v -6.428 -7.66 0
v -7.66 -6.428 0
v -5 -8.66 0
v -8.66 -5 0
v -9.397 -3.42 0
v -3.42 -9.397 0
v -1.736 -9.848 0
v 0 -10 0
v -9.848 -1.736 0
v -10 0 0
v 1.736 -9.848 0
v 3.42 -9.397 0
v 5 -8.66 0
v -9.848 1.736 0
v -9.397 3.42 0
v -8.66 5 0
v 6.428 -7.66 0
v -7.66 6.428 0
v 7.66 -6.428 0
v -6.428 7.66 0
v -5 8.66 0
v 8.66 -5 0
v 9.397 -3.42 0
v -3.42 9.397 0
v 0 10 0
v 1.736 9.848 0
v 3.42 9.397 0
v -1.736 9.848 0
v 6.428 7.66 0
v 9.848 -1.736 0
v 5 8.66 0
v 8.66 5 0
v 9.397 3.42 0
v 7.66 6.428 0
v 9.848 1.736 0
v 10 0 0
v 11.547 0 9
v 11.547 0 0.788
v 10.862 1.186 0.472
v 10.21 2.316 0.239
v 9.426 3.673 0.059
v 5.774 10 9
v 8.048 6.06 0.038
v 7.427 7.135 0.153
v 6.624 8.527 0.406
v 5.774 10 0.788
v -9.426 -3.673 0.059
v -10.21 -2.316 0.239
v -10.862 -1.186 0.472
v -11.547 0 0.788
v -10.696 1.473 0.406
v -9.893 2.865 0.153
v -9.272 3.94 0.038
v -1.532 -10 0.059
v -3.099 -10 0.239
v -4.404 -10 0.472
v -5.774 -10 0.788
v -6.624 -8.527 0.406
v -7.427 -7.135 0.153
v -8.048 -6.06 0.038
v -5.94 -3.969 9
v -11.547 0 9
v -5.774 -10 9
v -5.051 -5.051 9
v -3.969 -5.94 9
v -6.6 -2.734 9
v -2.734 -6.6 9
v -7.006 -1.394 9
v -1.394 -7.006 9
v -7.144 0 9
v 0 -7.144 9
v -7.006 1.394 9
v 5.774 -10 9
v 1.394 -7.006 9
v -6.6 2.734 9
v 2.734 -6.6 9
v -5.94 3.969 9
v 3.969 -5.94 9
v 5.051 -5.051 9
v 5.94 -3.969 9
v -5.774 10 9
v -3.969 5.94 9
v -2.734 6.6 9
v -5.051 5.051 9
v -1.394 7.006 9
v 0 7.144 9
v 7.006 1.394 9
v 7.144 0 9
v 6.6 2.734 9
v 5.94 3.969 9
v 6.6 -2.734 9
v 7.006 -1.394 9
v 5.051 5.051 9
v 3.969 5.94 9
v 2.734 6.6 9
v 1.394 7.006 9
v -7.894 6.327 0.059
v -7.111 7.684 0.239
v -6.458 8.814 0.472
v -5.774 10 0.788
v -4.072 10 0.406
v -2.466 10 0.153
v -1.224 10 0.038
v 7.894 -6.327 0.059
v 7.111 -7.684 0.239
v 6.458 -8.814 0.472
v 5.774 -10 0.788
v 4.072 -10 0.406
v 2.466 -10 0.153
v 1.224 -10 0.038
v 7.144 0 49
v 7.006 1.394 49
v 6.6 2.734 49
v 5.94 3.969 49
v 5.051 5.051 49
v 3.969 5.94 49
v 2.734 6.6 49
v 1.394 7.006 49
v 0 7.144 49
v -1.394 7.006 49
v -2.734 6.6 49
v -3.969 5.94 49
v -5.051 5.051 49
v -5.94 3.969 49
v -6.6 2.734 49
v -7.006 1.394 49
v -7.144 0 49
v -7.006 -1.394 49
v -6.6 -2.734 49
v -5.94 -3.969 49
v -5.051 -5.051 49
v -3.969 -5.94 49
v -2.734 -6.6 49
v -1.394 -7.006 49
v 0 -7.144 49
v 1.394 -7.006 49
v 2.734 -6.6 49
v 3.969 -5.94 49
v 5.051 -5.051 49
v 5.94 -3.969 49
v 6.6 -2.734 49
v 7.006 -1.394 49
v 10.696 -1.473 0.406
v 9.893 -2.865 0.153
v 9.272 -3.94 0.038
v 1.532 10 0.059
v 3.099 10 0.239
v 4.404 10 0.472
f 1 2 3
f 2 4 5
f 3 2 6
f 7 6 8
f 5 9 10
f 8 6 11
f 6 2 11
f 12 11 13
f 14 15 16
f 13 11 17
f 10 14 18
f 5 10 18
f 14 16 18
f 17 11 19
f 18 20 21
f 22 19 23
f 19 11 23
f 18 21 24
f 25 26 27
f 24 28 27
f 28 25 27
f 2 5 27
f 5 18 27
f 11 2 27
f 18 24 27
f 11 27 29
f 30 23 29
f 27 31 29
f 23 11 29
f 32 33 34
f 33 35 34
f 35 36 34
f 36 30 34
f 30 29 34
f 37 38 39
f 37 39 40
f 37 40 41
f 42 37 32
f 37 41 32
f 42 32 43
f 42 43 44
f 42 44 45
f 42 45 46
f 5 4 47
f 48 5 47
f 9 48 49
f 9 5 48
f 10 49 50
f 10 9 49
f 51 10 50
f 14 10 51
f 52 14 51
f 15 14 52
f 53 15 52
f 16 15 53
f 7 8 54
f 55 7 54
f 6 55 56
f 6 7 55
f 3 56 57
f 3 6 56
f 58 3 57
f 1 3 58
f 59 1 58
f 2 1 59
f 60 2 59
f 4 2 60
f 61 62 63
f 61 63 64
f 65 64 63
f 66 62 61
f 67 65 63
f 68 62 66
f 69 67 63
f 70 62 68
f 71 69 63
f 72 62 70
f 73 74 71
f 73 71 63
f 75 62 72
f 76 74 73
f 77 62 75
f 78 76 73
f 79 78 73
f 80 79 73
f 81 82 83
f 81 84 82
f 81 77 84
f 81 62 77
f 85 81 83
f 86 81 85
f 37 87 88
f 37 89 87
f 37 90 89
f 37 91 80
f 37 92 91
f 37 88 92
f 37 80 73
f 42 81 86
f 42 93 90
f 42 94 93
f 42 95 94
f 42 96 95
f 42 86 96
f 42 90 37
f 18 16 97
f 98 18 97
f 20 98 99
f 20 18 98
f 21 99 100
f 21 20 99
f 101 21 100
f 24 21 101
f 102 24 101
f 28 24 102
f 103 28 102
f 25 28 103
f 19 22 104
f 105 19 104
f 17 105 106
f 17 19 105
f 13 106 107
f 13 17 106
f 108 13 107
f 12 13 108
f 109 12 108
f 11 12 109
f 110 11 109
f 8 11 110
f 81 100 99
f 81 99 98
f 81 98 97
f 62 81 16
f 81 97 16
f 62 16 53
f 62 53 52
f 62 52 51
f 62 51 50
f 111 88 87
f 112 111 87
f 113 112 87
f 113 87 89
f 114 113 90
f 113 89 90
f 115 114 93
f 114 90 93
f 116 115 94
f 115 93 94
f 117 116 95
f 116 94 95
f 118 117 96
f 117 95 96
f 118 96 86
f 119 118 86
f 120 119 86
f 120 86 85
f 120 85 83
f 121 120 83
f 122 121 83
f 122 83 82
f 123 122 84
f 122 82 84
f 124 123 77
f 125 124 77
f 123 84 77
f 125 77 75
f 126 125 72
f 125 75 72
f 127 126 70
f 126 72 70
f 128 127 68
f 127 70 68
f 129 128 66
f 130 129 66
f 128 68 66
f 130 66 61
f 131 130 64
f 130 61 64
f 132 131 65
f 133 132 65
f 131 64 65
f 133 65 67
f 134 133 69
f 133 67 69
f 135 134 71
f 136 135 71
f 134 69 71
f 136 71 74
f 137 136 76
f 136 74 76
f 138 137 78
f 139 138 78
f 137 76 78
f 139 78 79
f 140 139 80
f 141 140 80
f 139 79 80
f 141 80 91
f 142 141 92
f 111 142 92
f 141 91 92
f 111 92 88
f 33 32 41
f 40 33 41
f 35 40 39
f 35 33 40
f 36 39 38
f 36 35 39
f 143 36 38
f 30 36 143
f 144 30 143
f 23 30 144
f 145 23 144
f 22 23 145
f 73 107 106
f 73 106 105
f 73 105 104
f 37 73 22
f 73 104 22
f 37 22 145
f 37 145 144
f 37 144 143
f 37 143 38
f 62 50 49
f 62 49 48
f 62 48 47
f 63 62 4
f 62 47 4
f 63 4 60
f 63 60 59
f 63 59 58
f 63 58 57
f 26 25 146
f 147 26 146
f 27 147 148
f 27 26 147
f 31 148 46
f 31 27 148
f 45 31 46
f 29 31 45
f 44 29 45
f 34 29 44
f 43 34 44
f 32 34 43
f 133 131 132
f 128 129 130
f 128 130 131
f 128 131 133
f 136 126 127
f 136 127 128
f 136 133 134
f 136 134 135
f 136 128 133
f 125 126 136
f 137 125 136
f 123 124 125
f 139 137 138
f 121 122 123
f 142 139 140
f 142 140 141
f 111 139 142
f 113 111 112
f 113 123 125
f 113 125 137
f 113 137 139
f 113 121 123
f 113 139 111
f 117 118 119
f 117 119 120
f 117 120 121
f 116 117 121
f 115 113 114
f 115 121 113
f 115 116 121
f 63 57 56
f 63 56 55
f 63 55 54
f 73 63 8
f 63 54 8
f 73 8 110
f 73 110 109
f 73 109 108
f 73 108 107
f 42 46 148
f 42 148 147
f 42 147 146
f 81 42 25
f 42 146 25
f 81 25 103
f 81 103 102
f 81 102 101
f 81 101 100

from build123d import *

# Parameters (mm, degrees)
SALIENTE_EXTRUIR1_DEPTH = 9
CROQUIS2_R              = 7.14375
SALIENTE_EXTRUIR2_DEPTH = 40
CROQUIS3_R              = 25.754458297
CROQUIS3_R_2            = 10
CORTAR_EXTRUIR1_DEPTH   = 3
CORTAR_EXTRUIR1_DRAFT   = -63


with BuildPart() as part:
    # Croquis1 → Saliente-Extruir1 (new body)
    with BuildSketch(Plane.XY):
        Polygon((11.547005384, 0), (5.773502692, 10), (-5.773502692, 10), (-11.547005384, 0), (-5.773502692, -10), (5.773502692, -10), align=None)
    extrude(amount=SALIENTE_EXTRUIR1_DEPTH)

    # Croquis2 → Saliente-Extruir2 (add)
    with BuildSketch(Plane.XY.offset(9)):
        Circle(CROQUIS2_R)
    extrude(amount=SALIENTE_EXTRUIR2_DEPTH)


with BuildPart() as cortar_extruir1_tool:
    # Croquis3 → Cortar-Extruir1 (with draft: the straight prism first)
    with BuildSketch(Plane(origin=(0, 0, 0), x_dir=(-1, 0, 0), z_dir=(0, 0, -1))):
        Circle(CROQUIS3_R)
        Circle(CROQUIS3_R_2, mode=Mode.SUBTRACT)
    extrude(amount=-CORTAR_EXTRUIR1_DEPTH)
    # Cortar-Extruir1: the draft: its side faces are tilted about the plane it starts from
    cortar_extruir1_sides = [cortar_extruir1_tool.faces().sort_by_distance(p)[0] for p in [
        (25.754458297, 0, 1.5),
        (10, 0, 1.5),
    ]]
    draft(cortar_extruir1_sides, Plane(origin=(0, 0, 0), x_dir=(-1, 0, 0), z_dir=(0, 0, -1)), CORTAR_EXTRUIR1_DRAFT)


with BuildPart() as part_1:
    add(part.part)

    # Cortar-Extruir1: cut by cortar_extruir1_tool
    add(cortar_extruir1_tool.part, mode=Mode.SUBTRACT)


solid = part_1.part
